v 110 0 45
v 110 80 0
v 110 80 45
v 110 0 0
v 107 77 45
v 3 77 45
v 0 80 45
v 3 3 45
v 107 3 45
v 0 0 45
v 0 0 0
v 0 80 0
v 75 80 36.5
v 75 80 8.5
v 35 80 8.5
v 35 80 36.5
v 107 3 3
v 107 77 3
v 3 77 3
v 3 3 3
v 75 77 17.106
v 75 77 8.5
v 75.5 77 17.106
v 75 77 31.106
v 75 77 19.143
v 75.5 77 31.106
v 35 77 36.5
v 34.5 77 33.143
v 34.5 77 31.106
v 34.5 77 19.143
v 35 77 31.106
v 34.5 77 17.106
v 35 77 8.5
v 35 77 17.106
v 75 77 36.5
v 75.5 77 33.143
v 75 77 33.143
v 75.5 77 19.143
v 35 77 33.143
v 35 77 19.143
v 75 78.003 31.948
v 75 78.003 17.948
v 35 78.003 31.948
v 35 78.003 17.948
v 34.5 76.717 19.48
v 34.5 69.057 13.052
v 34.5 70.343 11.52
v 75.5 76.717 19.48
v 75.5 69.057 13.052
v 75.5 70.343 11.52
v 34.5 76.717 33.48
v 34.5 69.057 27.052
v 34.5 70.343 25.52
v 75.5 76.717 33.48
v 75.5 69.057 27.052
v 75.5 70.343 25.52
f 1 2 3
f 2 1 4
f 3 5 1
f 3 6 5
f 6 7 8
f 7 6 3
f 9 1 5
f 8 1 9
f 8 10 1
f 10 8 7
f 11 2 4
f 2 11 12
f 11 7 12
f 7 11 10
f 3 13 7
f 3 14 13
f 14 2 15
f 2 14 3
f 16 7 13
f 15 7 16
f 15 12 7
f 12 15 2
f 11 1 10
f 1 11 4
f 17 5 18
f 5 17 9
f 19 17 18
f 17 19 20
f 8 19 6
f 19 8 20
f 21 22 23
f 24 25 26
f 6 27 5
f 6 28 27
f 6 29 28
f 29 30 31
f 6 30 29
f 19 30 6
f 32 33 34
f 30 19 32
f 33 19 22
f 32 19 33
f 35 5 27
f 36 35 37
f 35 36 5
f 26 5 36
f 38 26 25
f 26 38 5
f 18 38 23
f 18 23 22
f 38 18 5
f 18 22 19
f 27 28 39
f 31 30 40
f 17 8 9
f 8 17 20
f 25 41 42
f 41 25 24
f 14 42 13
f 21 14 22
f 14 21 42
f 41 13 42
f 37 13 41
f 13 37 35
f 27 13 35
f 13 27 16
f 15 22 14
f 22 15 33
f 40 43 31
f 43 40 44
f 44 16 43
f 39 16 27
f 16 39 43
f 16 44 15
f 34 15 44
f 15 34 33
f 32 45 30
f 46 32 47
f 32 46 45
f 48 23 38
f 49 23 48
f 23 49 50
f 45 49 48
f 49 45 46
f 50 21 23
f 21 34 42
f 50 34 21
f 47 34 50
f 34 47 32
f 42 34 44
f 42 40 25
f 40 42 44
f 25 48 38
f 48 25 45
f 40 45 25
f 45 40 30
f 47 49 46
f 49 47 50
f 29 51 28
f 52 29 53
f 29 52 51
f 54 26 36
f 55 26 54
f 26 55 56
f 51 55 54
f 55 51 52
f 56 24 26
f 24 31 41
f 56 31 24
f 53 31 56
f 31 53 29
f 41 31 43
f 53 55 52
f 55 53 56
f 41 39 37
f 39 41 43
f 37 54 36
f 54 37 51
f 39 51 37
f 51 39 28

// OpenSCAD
$fn = 32;

// ----------------------------------------------------------------------
// Vent box: louvers enclosure
// ----------------------------------------------------------------------

// --- parameters (mm) ---
box_l = 110;              // box length, X
box_w = 80;               // box width, Y
box_h = 45;               // box height, Z
wall_t = 3;               // shell wall thickness
win_l = 40;               // vent window width, X
win_h = 28;               // vent window height, Z
slat_t = 2;               // louver slat thickness
slat_d = 10;              // louver slat depth
slat_a = 40;              // louver slat angle, degrees
slat_pitch = 14;          // louver pitch
slat_yc = 73.53;          // slat centreline Y

win_z0 = (box_h - win_h) / 2;  // window lower edge Z
n_slats = 2;  // louver count
slat_z0 = win_z0 + (win_h - (n_slats - 1) * slat_pitch) / 2;

difference() {
  union() {
    difference() {
      cube([box_l, box_w, box_h]);
  translate([wall_t, wall_t, wall_t])
    cube([box_l - 2 * wall_t, box_w - 2 * wall_t, box_h]);
  translate([(box_l - win_l) / 2, box_w - wall_t - 1, win_z0])
    cube([win_l, wall_t + 2, win_h]);
    }
    for (i = [0 : n_slats - 1])
      translate([box_l / 2, slat_yc, slat_z0 + i * slat_pitch])
        rotate([slat_a, 0, 0])
          cube([win_l + 1, slat_d, slat_t], center = true);
  }
}
